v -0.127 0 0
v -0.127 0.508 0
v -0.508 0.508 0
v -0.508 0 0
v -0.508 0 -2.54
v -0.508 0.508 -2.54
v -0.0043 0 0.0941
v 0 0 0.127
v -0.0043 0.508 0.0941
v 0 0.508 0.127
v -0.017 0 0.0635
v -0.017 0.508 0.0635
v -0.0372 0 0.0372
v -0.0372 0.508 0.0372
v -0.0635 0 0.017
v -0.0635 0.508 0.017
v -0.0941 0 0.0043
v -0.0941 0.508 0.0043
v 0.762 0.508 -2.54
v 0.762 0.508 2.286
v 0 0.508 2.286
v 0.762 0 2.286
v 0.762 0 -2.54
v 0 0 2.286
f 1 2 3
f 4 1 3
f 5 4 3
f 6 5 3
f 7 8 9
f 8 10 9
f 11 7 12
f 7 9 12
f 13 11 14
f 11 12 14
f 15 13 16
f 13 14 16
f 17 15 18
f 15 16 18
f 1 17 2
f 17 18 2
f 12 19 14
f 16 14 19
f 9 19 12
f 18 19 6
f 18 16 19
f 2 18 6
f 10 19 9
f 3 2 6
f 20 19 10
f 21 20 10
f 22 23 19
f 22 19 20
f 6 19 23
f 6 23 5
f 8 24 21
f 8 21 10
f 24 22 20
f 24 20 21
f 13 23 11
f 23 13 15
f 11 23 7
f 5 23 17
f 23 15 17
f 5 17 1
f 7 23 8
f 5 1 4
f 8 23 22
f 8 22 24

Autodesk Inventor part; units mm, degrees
ref_plane "YZ Plane" through (0, 0, 0) normal (1, 0, 0) x (0, 1, 0)
ref_plane "XZ Plane" through (0, 0, 0) normal (0, 1, 0) x (-1, 0, 0)
ref_plane "XY Plane" through (0, 0, 0) normal (0, 0, 1) x (1, 0, 0)
sketch "Sketch1" plane through (0, 0, 0) normal (0, 1, 0) x (-1, 0, 0)
  line L0 (0, 0) -> (-0.762, 0)
  line L1 (-0.762, 0) -> (-0.762, 2.286)
  line L2 (-0.762, 2.286) -> (0, 2.286)
  line L3 (0, 2.286) -> (0, 0)
  dimension "d0" = 0.762
  dimension "d1" = 2.286
extrude "Extrusion1" add sketch "Sketch1" along normal blind 0.508
sketch "Sketch2" plane through (0.762, 0, 0) normal (0, 0, -1) x (-1, 0, 0)
  line L0 (0.762, 0) -> (0, 0) projected
  line L1 (0, 0) -> (1.27, 0)
  line L2 (1.27, 0) -> (1.27, 0.508)
  line L3 (1.27, 0.508) -> (0, 0.508)
  line L4 (0, 0.508) -> (0, 0)
  dimension "d4" = 1.27
extrude "Extrusion2" add sketch "Sketch2" along normal blind 2.54
fillet "Fillet1" radius 0.127 1 edges at (0, 0.254, 0)
properties part number "pins" material "Gold"
